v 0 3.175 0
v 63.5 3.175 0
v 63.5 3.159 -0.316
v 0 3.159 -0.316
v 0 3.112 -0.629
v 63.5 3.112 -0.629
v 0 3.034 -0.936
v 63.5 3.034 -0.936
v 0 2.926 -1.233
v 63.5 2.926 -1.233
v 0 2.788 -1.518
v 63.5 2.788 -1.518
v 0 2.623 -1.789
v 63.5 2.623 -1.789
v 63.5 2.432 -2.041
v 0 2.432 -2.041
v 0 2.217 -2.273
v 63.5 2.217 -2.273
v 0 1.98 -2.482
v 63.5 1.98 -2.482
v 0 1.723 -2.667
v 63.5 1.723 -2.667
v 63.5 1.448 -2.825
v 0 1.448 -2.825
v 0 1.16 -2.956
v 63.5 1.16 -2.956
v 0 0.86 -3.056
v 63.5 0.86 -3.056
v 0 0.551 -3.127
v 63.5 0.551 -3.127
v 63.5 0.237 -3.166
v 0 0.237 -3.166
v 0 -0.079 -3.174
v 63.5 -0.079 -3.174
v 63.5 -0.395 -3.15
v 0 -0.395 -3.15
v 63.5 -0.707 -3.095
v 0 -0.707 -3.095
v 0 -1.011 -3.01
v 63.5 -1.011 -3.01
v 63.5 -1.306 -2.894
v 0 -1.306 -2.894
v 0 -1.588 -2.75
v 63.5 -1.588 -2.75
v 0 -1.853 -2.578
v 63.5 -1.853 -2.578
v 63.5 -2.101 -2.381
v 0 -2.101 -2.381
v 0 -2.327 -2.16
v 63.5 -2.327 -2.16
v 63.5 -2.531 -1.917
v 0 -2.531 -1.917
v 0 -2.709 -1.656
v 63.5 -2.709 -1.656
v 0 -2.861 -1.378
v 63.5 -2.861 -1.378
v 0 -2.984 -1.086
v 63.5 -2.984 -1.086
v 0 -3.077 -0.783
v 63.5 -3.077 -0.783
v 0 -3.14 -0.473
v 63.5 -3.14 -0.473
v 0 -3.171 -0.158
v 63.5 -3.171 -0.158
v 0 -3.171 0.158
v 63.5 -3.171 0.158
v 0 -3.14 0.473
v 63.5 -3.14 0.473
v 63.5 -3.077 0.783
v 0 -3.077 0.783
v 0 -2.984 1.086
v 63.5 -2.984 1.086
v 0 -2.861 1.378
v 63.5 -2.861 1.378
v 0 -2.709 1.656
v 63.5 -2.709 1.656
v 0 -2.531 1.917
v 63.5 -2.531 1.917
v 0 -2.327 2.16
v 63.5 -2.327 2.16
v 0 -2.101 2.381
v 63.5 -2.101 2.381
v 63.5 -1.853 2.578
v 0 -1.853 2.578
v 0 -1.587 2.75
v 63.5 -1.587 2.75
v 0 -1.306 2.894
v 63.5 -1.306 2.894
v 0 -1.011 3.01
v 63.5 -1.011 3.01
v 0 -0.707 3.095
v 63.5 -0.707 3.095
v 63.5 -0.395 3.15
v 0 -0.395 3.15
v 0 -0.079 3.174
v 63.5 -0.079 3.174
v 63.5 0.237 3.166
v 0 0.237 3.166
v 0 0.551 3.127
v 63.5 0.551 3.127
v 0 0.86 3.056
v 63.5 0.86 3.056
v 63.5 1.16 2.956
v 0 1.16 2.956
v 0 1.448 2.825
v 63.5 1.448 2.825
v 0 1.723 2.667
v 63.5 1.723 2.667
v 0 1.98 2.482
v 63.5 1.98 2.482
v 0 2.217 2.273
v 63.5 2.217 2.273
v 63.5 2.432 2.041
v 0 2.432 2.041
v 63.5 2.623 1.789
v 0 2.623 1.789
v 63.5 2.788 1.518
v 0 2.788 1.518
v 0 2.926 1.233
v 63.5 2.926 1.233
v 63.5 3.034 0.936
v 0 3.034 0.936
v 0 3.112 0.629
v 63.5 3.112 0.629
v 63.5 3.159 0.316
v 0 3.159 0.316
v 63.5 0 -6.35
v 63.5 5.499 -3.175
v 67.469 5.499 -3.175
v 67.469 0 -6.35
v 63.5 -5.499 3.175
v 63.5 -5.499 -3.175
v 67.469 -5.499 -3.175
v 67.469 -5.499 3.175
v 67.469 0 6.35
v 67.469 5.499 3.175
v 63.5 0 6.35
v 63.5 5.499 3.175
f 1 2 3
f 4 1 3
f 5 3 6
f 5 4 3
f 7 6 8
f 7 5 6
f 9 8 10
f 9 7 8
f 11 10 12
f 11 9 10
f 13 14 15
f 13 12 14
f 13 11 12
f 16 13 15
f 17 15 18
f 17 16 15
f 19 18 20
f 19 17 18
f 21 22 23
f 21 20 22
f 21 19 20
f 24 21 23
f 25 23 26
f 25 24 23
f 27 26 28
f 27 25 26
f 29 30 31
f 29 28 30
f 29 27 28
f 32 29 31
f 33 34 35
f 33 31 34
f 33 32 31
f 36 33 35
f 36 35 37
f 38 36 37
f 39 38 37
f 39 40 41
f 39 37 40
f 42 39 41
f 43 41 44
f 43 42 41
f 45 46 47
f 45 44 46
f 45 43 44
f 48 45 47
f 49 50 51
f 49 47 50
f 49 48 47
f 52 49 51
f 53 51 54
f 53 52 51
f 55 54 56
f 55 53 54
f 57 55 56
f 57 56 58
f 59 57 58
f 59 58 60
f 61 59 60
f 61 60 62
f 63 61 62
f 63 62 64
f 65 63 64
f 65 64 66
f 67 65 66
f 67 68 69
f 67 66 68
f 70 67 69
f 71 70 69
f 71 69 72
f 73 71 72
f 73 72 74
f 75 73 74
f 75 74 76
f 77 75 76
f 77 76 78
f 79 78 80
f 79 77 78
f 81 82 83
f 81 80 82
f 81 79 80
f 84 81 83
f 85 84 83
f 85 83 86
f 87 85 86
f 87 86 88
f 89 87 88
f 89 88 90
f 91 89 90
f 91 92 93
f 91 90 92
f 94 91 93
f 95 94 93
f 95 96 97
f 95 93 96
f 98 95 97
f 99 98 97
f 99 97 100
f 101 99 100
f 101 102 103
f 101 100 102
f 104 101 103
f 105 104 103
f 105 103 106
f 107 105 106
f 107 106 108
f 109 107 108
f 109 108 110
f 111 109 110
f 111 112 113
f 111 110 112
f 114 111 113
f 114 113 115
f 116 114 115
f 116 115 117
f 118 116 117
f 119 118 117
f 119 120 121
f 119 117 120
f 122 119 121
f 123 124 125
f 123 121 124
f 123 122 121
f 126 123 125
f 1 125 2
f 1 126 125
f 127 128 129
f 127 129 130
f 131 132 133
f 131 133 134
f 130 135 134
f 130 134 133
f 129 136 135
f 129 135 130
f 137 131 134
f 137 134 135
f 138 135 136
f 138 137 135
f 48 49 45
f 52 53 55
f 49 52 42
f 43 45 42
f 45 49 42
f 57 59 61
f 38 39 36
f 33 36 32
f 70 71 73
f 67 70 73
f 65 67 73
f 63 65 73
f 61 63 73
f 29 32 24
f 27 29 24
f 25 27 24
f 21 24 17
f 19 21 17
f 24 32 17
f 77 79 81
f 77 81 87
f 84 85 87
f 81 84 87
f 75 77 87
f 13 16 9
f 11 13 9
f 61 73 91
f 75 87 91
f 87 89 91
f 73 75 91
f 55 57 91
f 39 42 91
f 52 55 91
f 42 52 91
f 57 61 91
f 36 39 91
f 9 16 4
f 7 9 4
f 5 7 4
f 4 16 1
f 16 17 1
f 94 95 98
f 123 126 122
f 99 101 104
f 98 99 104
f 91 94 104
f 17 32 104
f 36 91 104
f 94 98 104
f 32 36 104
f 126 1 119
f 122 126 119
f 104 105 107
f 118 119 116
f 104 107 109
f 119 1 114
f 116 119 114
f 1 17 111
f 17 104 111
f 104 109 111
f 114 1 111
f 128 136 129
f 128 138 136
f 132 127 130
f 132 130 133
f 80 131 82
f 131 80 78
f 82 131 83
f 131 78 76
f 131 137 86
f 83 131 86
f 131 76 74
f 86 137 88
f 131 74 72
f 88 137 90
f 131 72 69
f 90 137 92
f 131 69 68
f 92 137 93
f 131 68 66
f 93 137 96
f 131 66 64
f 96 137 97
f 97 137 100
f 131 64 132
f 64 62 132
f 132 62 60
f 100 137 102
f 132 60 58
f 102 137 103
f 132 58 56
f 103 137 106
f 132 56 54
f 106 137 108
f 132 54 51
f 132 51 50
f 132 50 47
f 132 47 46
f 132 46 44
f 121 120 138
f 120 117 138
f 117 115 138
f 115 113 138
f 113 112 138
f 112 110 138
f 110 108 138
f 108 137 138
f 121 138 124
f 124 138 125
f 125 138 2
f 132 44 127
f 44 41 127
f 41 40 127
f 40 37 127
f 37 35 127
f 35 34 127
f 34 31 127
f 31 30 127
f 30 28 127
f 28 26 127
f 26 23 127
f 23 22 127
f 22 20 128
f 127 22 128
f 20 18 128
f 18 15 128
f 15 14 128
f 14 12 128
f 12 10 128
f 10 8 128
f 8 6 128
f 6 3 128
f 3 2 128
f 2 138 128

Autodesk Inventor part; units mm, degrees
ref_plane "YZ Plane" through (0, 0, 0) normal (1, 0, 0) x (0, 1, 0)
ref_plane "XZ Plane" through (0, 0, 0) normal (0, 1, 0) x (-1, 0, 0)
ref_plane "XY Plane" through (0, 0, 0) normal (0, 0, 1) x (1, 0, 0)
sketch "Sketch1" plane through (0, 0, 0) normal (1, 0, 0) x (0, 1, 0)
  circle A0 centre (0, 0) radius 3.175
  dimension "d0" = 6.35
extrude "Extrusion1" add sketch "Sketch1" along normal blind 63.5
thread "Thread1" size "1/4-20 UNC" class "2A" standard "ANSI Unified Screw Threads" full length
sketch "Sketch2" plane through (63.5, 0, 0) normal (1, 0, 0) x (0, 0, -1)
  circle A0 centre (0, 0) radius 6.35
  line L0 (6.35, 0) -> (3.175, -5.4993)
  line L1 (3.175, -5.4993) -> (-3.175, -5.4993)
  line L2 (-3.175, -5.4993) -> (-6.35, 0)
  line L3 (-6.35, 0) -> (-3.175, 5.4993)
  line L4 (-3.175, 5.4993) -> (3.175, 5.4993)
  line L5 (3.175, 5.4993) -> (6.35, 0)
  dimension "d5" = 12.7
extrude "Extrusion2" add sketch "Sketch2" along normal blind 3.9688 contours L0 L1 L2 L3 L4 L5
properties part number "support bolt"
